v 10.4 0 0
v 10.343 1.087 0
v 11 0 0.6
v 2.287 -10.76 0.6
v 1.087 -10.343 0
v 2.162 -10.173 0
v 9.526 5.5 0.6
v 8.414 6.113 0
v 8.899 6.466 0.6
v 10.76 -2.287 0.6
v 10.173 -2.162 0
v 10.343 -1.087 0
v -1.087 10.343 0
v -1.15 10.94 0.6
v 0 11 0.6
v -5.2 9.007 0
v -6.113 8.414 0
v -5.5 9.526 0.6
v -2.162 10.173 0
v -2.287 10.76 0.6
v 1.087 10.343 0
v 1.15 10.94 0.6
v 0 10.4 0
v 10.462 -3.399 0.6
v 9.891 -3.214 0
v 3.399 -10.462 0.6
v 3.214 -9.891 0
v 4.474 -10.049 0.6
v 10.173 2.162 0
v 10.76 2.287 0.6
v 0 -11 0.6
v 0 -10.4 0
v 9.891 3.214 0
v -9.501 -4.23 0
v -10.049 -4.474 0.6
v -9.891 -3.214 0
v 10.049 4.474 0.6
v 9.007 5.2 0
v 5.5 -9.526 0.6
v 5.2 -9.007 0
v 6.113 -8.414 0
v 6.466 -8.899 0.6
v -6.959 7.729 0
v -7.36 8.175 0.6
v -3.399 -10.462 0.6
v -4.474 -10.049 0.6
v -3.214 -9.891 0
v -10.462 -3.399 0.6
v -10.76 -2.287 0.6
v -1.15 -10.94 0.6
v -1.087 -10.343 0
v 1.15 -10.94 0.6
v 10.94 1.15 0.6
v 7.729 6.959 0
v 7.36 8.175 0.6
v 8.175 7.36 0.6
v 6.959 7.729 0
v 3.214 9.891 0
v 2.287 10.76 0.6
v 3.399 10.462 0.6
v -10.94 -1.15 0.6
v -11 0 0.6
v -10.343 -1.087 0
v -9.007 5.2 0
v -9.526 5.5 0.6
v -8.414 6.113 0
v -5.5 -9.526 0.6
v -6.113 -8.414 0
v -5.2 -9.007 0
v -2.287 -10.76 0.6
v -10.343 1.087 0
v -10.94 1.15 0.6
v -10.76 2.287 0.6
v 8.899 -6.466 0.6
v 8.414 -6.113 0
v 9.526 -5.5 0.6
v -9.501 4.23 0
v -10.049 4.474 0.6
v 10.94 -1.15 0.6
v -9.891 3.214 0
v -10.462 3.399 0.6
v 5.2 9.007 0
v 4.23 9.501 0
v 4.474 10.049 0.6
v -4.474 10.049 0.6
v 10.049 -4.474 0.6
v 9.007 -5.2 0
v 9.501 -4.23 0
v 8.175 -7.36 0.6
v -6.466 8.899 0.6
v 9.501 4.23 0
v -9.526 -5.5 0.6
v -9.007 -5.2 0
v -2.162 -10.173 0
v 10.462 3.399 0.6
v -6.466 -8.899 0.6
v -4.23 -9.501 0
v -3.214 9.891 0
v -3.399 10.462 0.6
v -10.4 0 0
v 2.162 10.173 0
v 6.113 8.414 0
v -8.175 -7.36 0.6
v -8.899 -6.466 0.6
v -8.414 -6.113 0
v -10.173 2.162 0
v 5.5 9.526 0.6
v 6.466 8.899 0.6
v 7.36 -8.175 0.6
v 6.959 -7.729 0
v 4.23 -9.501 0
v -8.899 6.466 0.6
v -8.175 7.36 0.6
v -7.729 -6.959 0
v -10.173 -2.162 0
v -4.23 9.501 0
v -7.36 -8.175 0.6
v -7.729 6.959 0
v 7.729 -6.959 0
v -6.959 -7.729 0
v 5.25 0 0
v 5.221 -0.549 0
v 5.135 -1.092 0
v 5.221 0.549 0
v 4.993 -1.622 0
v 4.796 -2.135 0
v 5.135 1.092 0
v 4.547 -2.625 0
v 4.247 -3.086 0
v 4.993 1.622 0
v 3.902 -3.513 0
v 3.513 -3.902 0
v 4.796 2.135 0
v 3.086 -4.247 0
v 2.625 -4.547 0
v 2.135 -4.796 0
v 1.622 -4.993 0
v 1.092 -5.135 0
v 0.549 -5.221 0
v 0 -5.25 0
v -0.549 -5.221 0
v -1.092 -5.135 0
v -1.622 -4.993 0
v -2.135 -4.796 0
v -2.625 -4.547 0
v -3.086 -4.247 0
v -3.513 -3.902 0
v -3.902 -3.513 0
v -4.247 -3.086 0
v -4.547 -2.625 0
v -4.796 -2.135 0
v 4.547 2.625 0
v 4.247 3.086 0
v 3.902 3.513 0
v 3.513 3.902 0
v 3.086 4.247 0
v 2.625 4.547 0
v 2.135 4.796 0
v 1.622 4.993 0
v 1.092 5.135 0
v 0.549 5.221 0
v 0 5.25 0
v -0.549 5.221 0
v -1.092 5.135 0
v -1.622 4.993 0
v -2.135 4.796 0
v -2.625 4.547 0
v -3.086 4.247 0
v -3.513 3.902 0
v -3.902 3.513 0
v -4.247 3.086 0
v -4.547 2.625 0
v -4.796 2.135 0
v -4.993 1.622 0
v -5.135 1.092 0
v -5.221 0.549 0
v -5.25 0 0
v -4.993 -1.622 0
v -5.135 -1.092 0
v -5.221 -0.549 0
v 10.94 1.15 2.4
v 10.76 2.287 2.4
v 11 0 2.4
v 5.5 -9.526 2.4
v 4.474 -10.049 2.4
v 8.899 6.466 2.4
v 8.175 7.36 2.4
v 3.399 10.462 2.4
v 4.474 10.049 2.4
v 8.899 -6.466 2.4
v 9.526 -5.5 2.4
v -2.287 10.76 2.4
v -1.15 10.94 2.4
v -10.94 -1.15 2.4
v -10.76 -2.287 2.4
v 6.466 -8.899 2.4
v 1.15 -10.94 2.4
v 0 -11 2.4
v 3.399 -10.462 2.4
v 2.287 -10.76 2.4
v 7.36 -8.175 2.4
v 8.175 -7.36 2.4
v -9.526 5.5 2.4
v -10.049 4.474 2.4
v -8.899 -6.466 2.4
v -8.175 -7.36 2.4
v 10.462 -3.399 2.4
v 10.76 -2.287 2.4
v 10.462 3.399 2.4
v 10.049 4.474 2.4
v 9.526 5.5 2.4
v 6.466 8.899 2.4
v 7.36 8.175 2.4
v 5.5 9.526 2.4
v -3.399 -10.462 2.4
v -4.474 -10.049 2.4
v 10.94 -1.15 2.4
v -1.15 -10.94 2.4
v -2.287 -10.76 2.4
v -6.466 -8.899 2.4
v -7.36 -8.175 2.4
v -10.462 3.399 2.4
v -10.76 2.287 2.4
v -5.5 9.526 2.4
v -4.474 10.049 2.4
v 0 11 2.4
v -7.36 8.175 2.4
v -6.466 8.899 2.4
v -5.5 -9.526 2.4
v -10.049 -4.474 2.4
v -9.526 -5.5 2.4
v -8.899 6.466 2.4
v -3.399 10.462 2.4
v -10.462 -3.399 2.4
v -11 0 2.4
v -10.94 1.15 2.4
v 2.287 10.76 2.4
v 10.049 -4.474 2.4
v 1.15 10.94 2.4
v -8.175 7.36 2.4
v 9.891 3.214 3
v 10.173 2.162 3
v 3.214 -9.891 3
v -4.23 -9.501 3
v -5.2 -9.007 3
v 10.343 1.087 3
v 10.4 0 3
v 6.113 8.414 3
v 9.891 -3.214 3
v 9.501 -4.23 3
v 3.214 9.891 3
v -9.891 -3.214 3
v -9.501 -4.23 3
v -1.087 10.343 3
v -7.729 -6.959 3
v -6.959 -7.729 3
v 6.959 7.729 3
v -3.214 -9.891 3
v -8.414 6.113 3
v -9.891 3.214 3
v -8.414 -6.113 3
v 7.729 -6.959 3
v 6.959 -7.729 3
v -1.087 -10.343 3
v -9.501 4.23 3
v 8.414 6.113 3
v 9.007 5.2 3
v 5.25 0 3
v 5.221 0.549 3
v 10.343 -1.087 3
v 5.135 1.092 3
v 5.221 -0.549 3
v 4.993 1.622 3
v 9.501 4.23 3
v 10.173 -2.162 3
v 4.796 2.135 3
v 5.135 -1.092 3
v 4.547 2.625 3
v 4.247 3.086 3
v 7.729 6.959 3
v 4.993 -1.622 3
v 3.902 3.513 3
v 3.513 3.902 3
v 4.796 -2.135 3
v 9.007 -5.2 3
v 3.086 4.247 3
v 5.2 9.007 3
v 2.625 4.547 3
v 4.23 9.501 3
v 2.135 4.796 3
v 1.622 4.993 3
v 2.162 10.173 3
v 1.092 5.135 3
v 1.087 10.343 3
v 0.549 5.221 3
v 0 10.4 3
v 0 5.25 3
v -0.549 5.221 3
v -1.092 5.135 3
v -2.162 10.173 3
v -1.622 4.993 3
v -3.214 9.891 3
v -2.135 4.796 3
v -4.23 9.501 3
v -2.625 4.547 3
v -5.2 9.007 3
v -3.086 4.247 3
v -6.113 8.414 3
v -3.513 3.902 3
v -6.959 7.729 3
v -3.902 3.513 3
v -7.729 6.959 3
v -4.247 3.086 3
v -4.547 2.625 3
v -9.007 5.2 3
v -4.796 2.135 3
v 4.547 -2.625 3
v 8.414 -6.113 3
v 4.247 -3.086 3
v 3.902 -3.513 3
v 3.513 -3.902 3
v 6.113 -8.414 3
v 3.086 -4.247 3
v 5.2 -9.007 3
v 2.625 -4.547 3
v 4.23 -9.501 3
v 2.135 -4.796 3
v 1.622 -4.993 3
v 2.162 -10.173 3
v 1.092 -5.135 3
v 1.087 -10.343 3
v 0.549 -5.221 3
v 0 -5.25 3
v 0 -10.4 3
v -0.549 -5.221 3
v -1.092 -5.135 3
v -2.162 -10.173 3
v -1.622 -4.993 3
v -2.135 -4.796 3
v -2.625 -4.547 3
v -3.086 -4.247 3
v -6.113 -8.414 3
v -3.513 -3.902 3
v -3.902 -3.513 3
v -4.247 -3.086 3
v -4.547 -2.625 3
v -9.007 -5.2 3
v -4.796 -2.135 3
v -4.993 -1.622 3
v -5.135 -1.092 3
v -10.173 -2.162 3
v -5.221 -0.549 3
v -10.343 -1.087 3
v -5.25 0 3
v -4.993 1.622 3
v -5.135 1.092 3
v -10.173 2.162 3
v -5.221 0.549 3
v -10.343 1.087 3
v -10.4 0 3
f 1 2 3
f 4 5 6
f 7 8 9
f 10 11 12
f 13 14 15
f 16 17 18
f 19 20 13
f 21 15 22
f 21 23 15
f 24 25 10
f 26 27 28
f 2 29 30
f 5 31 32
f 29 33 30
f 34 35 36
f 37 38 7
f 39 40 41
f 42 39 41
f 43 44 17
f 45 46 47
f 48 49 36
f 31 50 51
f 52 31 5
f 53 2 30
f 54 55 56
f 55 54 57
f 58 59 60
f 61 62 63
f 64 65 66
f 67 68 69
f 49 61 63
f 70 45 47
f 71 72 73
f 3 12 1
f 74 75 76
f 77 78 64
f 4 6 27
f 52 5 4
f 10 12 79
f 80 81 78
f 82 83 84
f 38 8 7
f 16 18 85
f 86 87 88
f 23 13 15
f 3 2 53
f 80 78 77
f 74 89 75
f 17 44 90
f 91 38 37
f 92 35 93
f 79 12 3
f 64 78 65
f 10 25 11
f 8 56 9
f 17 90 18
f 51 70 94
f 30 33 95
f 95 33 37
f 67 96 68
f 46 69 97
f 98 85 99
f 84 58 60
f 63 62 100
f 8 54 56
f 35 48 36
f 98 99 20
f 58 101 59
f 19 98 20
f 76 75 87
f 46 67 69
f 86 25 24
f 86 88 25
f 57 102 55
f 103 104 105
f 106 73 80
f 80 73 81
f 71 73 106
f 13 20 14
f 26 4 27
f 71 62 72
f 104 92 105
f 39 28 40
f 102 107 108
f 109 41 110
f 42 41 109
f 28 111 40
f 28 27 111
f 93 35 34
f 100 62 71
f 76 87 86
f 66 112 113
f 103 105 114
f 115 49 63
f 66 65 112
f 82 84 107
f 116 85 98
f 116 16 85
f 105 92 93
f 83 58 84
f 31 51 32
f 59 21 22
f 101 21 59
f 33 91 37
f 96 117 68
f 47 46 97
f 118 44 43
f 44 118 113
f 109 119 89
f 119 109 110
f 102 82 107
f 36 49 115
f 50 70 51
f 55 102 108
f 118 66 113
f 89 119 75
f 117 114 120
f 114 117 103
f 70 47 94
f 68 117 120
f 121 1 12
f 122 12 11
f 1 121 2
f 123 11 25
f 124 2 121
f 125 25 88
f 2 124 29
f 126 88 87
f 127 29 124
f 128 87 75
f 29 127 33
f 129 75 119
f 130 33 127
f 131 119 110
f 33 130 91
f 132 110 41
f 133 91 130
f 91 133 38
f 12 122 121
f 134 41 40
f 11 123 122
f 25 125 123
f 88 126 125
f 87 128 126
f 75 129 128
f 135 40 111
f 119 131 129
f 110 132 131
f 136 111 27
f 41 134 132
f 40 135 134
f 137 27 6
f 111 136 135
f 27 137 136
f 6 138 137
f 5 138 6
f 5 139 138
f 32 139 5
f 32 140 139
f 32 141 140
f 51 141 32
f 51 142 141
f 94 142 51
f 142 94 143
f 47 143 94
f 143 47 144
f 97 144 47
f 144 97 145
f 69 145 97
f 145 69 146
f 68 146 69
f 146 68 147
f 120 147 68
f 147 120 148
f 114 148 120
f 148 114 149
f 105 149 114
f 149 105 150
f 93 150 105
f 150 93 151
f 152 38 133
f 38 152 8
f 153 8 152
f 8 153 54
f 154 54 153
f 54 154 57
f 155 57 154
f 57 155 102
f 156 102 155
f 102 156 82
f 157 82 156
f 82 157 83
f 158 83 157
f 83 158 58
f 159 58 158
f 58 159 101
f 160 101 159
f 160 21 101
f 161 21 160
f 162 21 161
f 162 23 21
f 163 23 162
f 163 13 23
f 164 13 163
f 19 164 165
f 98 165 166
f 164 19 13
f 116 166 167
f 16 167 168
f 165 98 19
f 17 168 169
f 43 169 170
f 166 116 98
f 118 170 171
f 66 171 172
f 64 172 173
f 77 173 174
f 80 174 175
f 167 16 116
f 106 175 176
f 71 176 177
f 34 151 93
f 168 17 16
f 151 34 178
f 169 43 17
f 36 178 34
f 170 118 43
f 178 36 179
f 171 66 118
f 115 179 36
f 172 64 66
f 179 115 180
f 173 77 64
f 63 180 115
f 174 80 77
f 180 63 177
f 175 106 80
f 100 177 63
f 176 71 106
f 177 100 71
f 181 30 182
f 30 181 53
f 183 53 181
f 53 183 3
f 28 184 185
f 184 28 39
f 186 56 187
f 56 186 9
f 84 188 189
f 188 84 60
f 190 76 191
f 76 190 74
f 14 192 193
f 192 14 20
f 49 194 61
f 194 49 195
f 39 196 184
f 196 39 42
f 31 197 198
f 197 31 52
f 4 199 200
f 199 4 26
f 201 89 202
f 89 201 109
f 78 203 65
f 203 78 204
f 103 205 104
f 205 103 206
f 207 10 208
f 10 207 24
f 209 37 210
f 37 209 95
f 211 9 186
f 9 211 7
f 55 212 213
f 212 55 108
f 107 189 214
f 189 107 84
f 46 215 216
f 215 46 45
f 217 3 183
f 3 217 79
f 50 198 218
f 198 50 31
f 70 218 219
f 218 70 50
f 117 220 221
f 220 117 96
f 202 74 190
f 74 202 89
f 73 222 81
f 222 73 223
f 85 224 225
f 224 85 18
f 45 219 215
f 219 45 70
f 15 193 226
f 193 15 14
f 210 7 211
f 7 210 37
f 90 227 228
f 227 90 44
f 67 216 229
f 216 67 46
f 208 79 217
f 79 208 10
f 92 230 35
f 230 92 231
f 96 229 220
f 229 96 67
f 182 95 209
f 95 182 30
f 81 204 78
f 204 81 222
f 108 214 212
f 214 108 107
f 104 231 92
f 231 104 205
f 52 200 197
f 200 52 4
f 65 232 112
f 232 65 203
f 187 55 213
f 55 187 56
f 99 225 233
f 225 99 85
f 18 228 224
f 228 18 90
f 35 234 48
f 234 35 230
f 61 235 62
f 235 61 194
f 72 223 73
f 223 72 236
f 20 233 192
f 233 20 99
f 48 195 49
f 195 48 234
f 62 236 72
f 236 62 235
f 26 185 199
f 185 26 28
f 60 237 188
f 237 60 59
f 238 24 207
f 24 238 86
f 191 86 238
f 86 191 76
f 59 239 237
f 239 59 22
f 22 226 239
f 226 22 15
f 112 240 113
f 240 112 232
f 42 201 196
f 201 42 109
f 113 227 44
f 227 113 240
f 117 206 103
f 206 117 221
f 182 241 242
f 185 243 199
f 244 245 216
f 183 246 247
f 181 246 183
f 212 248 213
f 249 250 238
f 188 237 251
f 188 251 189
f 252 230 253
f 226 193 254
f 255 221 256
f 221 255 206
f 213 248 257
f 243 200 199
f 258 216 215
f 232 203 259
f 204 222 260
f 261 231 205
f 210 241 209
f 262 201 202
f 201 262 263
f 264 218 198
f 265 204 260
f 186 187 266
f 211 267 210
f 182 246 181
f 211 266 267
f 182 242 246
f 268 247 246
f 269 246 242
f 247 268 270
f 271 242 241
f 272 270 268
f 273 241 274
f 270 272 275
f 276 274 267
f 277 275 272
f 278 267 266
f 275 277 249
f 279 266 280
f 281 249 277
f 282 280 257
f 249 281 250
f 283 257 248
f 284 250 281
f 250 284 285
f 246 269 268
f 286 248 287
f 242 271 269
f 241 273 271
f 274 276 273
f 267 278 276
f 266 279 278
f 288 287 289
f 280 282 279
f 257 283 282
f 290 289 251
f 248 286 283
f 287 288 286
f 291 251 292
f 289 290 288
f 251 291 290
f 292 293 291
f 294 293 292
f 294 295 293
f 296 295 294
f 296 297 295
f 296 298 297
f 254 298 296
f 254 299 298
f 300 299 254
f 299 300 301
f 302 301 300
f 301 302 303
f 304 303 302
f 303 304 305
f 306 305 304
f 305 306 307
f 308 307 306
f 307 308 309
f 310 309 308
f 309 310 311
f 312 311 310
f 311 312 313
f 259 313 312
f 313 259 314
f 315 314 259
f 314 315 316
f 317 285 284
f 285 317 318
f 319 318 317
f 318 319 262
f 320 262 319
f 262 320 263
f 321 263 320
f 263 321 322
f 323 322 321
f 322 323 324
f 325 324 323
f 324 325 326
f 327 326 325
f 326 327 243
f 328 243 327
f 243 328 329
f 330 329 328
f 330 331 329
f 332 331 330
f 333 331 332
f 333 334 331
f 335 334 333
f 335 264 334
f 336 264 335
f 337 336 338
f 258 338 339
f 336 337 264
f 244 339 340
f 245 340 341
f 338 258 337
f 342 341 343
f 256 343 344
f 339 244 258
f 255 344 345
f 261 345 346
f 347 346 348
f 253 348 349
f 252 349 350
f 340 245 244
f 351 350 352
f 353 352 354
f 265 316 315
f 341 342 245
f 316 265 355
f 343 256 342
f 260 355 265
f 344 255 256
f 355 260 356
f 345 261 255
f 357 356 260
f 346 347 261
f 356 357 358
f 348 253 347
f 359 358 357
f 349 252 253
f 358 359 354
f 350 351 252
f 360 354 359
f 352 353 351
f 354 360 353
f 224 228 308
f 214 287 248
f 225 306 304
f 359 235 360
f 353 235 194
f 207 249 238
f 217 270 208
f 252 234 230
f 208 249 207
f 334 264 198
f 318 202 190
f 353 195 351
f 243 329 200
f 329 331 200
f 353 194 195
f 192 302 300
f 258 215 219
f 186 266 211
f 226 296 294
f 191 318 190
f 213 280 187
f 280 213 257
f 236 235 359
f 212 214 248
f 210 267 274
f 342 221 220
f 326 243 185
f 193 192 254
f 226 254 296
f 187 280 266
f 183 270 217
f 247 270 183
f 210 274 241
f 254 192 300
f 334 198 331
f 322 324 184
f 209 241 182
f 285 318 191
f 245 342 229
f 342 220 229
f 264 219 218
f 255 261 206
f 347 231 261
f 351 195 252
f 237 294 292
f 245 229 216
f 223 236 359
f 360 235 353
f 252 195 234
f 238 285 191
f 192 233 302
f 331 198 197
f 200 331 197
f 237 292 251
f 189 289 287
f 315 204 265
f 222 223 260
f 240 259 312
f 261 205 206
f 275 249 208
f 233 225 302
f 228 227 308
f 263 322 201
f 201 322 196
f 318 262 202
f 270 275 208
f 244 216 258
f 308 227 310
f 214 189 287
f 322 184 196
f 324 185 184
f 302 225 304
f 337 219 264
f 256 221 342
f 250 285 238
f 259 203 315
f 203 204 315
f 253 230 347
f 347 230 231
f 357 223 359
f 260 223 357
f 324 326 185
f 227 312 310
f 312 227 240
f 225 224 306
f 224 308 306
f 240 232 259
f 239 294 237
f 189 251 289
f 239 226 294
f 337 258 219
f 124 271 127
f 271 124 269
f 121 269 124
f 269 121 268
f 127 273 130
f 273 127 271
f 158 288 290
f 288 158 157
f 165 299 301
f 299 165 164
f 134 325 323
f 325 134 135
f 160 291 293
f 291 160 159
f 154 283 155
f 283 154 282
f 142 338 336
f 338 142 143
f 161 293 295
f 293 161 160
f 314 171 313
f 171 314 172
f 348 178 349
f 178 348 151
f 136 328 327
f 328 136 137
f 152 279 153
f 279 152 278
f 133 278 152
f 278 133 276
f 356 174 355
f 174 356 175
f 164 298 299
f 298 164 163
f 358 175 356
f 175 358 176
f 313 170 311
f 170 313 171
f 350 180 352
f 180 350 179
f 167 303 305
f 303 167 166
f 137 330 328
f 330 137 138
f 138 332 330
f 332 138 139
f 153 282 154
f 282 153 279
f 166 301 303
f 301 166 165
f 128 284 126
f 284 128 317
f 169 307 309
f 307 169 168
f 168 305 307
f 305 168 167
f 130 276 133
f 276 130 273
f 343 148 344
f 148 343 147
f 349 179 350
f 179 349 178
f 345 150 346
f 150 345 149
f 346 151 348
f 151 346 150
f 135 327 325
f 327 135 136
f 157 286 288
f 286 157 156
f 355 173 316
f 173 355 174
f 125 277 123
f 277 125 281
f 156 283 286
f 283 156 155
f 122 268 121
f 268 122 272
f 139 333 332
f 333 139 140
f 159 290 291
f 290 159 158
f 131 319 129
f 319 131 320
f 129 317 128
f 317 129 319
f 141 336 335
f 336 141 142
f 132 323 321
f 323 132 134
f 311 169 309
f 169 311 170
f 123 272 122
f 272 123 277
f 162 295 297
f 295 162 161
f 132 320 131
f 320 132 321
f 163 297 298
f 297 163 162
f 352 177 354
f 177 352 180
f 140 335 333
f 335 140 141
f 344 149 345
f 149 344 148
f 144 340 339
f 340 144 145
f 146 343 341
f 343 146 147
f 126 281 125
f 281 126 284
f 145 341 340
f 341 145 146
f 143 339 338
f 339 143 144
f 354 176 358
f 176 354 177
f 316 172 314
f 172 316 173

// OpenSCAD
// Chamfered metric washer.
$fn = 60;
eps = 0.02;
inner_d = 10.5;
outer_d = 22;
thickness = 3;
chamfer = 0.6;
difference() {
    union() {
        cylinder(d1 = outer_d - 2 * chamfer, d2 = outer_d, h = chamfer);
        translate([0, 0, chamfer]) cylinder(d = outer_d, h = thickness - 2 * chamfer);
        translate([0, 0, thickness - chamfer]) cylinder(d1 = outer_d, d2 = outer_d - 2 * chamfer, h = chamfer);
    }
    translate([0, 0, -eps]) cylinder(d = inner_d, h = thickness + 2 * eps);
}
